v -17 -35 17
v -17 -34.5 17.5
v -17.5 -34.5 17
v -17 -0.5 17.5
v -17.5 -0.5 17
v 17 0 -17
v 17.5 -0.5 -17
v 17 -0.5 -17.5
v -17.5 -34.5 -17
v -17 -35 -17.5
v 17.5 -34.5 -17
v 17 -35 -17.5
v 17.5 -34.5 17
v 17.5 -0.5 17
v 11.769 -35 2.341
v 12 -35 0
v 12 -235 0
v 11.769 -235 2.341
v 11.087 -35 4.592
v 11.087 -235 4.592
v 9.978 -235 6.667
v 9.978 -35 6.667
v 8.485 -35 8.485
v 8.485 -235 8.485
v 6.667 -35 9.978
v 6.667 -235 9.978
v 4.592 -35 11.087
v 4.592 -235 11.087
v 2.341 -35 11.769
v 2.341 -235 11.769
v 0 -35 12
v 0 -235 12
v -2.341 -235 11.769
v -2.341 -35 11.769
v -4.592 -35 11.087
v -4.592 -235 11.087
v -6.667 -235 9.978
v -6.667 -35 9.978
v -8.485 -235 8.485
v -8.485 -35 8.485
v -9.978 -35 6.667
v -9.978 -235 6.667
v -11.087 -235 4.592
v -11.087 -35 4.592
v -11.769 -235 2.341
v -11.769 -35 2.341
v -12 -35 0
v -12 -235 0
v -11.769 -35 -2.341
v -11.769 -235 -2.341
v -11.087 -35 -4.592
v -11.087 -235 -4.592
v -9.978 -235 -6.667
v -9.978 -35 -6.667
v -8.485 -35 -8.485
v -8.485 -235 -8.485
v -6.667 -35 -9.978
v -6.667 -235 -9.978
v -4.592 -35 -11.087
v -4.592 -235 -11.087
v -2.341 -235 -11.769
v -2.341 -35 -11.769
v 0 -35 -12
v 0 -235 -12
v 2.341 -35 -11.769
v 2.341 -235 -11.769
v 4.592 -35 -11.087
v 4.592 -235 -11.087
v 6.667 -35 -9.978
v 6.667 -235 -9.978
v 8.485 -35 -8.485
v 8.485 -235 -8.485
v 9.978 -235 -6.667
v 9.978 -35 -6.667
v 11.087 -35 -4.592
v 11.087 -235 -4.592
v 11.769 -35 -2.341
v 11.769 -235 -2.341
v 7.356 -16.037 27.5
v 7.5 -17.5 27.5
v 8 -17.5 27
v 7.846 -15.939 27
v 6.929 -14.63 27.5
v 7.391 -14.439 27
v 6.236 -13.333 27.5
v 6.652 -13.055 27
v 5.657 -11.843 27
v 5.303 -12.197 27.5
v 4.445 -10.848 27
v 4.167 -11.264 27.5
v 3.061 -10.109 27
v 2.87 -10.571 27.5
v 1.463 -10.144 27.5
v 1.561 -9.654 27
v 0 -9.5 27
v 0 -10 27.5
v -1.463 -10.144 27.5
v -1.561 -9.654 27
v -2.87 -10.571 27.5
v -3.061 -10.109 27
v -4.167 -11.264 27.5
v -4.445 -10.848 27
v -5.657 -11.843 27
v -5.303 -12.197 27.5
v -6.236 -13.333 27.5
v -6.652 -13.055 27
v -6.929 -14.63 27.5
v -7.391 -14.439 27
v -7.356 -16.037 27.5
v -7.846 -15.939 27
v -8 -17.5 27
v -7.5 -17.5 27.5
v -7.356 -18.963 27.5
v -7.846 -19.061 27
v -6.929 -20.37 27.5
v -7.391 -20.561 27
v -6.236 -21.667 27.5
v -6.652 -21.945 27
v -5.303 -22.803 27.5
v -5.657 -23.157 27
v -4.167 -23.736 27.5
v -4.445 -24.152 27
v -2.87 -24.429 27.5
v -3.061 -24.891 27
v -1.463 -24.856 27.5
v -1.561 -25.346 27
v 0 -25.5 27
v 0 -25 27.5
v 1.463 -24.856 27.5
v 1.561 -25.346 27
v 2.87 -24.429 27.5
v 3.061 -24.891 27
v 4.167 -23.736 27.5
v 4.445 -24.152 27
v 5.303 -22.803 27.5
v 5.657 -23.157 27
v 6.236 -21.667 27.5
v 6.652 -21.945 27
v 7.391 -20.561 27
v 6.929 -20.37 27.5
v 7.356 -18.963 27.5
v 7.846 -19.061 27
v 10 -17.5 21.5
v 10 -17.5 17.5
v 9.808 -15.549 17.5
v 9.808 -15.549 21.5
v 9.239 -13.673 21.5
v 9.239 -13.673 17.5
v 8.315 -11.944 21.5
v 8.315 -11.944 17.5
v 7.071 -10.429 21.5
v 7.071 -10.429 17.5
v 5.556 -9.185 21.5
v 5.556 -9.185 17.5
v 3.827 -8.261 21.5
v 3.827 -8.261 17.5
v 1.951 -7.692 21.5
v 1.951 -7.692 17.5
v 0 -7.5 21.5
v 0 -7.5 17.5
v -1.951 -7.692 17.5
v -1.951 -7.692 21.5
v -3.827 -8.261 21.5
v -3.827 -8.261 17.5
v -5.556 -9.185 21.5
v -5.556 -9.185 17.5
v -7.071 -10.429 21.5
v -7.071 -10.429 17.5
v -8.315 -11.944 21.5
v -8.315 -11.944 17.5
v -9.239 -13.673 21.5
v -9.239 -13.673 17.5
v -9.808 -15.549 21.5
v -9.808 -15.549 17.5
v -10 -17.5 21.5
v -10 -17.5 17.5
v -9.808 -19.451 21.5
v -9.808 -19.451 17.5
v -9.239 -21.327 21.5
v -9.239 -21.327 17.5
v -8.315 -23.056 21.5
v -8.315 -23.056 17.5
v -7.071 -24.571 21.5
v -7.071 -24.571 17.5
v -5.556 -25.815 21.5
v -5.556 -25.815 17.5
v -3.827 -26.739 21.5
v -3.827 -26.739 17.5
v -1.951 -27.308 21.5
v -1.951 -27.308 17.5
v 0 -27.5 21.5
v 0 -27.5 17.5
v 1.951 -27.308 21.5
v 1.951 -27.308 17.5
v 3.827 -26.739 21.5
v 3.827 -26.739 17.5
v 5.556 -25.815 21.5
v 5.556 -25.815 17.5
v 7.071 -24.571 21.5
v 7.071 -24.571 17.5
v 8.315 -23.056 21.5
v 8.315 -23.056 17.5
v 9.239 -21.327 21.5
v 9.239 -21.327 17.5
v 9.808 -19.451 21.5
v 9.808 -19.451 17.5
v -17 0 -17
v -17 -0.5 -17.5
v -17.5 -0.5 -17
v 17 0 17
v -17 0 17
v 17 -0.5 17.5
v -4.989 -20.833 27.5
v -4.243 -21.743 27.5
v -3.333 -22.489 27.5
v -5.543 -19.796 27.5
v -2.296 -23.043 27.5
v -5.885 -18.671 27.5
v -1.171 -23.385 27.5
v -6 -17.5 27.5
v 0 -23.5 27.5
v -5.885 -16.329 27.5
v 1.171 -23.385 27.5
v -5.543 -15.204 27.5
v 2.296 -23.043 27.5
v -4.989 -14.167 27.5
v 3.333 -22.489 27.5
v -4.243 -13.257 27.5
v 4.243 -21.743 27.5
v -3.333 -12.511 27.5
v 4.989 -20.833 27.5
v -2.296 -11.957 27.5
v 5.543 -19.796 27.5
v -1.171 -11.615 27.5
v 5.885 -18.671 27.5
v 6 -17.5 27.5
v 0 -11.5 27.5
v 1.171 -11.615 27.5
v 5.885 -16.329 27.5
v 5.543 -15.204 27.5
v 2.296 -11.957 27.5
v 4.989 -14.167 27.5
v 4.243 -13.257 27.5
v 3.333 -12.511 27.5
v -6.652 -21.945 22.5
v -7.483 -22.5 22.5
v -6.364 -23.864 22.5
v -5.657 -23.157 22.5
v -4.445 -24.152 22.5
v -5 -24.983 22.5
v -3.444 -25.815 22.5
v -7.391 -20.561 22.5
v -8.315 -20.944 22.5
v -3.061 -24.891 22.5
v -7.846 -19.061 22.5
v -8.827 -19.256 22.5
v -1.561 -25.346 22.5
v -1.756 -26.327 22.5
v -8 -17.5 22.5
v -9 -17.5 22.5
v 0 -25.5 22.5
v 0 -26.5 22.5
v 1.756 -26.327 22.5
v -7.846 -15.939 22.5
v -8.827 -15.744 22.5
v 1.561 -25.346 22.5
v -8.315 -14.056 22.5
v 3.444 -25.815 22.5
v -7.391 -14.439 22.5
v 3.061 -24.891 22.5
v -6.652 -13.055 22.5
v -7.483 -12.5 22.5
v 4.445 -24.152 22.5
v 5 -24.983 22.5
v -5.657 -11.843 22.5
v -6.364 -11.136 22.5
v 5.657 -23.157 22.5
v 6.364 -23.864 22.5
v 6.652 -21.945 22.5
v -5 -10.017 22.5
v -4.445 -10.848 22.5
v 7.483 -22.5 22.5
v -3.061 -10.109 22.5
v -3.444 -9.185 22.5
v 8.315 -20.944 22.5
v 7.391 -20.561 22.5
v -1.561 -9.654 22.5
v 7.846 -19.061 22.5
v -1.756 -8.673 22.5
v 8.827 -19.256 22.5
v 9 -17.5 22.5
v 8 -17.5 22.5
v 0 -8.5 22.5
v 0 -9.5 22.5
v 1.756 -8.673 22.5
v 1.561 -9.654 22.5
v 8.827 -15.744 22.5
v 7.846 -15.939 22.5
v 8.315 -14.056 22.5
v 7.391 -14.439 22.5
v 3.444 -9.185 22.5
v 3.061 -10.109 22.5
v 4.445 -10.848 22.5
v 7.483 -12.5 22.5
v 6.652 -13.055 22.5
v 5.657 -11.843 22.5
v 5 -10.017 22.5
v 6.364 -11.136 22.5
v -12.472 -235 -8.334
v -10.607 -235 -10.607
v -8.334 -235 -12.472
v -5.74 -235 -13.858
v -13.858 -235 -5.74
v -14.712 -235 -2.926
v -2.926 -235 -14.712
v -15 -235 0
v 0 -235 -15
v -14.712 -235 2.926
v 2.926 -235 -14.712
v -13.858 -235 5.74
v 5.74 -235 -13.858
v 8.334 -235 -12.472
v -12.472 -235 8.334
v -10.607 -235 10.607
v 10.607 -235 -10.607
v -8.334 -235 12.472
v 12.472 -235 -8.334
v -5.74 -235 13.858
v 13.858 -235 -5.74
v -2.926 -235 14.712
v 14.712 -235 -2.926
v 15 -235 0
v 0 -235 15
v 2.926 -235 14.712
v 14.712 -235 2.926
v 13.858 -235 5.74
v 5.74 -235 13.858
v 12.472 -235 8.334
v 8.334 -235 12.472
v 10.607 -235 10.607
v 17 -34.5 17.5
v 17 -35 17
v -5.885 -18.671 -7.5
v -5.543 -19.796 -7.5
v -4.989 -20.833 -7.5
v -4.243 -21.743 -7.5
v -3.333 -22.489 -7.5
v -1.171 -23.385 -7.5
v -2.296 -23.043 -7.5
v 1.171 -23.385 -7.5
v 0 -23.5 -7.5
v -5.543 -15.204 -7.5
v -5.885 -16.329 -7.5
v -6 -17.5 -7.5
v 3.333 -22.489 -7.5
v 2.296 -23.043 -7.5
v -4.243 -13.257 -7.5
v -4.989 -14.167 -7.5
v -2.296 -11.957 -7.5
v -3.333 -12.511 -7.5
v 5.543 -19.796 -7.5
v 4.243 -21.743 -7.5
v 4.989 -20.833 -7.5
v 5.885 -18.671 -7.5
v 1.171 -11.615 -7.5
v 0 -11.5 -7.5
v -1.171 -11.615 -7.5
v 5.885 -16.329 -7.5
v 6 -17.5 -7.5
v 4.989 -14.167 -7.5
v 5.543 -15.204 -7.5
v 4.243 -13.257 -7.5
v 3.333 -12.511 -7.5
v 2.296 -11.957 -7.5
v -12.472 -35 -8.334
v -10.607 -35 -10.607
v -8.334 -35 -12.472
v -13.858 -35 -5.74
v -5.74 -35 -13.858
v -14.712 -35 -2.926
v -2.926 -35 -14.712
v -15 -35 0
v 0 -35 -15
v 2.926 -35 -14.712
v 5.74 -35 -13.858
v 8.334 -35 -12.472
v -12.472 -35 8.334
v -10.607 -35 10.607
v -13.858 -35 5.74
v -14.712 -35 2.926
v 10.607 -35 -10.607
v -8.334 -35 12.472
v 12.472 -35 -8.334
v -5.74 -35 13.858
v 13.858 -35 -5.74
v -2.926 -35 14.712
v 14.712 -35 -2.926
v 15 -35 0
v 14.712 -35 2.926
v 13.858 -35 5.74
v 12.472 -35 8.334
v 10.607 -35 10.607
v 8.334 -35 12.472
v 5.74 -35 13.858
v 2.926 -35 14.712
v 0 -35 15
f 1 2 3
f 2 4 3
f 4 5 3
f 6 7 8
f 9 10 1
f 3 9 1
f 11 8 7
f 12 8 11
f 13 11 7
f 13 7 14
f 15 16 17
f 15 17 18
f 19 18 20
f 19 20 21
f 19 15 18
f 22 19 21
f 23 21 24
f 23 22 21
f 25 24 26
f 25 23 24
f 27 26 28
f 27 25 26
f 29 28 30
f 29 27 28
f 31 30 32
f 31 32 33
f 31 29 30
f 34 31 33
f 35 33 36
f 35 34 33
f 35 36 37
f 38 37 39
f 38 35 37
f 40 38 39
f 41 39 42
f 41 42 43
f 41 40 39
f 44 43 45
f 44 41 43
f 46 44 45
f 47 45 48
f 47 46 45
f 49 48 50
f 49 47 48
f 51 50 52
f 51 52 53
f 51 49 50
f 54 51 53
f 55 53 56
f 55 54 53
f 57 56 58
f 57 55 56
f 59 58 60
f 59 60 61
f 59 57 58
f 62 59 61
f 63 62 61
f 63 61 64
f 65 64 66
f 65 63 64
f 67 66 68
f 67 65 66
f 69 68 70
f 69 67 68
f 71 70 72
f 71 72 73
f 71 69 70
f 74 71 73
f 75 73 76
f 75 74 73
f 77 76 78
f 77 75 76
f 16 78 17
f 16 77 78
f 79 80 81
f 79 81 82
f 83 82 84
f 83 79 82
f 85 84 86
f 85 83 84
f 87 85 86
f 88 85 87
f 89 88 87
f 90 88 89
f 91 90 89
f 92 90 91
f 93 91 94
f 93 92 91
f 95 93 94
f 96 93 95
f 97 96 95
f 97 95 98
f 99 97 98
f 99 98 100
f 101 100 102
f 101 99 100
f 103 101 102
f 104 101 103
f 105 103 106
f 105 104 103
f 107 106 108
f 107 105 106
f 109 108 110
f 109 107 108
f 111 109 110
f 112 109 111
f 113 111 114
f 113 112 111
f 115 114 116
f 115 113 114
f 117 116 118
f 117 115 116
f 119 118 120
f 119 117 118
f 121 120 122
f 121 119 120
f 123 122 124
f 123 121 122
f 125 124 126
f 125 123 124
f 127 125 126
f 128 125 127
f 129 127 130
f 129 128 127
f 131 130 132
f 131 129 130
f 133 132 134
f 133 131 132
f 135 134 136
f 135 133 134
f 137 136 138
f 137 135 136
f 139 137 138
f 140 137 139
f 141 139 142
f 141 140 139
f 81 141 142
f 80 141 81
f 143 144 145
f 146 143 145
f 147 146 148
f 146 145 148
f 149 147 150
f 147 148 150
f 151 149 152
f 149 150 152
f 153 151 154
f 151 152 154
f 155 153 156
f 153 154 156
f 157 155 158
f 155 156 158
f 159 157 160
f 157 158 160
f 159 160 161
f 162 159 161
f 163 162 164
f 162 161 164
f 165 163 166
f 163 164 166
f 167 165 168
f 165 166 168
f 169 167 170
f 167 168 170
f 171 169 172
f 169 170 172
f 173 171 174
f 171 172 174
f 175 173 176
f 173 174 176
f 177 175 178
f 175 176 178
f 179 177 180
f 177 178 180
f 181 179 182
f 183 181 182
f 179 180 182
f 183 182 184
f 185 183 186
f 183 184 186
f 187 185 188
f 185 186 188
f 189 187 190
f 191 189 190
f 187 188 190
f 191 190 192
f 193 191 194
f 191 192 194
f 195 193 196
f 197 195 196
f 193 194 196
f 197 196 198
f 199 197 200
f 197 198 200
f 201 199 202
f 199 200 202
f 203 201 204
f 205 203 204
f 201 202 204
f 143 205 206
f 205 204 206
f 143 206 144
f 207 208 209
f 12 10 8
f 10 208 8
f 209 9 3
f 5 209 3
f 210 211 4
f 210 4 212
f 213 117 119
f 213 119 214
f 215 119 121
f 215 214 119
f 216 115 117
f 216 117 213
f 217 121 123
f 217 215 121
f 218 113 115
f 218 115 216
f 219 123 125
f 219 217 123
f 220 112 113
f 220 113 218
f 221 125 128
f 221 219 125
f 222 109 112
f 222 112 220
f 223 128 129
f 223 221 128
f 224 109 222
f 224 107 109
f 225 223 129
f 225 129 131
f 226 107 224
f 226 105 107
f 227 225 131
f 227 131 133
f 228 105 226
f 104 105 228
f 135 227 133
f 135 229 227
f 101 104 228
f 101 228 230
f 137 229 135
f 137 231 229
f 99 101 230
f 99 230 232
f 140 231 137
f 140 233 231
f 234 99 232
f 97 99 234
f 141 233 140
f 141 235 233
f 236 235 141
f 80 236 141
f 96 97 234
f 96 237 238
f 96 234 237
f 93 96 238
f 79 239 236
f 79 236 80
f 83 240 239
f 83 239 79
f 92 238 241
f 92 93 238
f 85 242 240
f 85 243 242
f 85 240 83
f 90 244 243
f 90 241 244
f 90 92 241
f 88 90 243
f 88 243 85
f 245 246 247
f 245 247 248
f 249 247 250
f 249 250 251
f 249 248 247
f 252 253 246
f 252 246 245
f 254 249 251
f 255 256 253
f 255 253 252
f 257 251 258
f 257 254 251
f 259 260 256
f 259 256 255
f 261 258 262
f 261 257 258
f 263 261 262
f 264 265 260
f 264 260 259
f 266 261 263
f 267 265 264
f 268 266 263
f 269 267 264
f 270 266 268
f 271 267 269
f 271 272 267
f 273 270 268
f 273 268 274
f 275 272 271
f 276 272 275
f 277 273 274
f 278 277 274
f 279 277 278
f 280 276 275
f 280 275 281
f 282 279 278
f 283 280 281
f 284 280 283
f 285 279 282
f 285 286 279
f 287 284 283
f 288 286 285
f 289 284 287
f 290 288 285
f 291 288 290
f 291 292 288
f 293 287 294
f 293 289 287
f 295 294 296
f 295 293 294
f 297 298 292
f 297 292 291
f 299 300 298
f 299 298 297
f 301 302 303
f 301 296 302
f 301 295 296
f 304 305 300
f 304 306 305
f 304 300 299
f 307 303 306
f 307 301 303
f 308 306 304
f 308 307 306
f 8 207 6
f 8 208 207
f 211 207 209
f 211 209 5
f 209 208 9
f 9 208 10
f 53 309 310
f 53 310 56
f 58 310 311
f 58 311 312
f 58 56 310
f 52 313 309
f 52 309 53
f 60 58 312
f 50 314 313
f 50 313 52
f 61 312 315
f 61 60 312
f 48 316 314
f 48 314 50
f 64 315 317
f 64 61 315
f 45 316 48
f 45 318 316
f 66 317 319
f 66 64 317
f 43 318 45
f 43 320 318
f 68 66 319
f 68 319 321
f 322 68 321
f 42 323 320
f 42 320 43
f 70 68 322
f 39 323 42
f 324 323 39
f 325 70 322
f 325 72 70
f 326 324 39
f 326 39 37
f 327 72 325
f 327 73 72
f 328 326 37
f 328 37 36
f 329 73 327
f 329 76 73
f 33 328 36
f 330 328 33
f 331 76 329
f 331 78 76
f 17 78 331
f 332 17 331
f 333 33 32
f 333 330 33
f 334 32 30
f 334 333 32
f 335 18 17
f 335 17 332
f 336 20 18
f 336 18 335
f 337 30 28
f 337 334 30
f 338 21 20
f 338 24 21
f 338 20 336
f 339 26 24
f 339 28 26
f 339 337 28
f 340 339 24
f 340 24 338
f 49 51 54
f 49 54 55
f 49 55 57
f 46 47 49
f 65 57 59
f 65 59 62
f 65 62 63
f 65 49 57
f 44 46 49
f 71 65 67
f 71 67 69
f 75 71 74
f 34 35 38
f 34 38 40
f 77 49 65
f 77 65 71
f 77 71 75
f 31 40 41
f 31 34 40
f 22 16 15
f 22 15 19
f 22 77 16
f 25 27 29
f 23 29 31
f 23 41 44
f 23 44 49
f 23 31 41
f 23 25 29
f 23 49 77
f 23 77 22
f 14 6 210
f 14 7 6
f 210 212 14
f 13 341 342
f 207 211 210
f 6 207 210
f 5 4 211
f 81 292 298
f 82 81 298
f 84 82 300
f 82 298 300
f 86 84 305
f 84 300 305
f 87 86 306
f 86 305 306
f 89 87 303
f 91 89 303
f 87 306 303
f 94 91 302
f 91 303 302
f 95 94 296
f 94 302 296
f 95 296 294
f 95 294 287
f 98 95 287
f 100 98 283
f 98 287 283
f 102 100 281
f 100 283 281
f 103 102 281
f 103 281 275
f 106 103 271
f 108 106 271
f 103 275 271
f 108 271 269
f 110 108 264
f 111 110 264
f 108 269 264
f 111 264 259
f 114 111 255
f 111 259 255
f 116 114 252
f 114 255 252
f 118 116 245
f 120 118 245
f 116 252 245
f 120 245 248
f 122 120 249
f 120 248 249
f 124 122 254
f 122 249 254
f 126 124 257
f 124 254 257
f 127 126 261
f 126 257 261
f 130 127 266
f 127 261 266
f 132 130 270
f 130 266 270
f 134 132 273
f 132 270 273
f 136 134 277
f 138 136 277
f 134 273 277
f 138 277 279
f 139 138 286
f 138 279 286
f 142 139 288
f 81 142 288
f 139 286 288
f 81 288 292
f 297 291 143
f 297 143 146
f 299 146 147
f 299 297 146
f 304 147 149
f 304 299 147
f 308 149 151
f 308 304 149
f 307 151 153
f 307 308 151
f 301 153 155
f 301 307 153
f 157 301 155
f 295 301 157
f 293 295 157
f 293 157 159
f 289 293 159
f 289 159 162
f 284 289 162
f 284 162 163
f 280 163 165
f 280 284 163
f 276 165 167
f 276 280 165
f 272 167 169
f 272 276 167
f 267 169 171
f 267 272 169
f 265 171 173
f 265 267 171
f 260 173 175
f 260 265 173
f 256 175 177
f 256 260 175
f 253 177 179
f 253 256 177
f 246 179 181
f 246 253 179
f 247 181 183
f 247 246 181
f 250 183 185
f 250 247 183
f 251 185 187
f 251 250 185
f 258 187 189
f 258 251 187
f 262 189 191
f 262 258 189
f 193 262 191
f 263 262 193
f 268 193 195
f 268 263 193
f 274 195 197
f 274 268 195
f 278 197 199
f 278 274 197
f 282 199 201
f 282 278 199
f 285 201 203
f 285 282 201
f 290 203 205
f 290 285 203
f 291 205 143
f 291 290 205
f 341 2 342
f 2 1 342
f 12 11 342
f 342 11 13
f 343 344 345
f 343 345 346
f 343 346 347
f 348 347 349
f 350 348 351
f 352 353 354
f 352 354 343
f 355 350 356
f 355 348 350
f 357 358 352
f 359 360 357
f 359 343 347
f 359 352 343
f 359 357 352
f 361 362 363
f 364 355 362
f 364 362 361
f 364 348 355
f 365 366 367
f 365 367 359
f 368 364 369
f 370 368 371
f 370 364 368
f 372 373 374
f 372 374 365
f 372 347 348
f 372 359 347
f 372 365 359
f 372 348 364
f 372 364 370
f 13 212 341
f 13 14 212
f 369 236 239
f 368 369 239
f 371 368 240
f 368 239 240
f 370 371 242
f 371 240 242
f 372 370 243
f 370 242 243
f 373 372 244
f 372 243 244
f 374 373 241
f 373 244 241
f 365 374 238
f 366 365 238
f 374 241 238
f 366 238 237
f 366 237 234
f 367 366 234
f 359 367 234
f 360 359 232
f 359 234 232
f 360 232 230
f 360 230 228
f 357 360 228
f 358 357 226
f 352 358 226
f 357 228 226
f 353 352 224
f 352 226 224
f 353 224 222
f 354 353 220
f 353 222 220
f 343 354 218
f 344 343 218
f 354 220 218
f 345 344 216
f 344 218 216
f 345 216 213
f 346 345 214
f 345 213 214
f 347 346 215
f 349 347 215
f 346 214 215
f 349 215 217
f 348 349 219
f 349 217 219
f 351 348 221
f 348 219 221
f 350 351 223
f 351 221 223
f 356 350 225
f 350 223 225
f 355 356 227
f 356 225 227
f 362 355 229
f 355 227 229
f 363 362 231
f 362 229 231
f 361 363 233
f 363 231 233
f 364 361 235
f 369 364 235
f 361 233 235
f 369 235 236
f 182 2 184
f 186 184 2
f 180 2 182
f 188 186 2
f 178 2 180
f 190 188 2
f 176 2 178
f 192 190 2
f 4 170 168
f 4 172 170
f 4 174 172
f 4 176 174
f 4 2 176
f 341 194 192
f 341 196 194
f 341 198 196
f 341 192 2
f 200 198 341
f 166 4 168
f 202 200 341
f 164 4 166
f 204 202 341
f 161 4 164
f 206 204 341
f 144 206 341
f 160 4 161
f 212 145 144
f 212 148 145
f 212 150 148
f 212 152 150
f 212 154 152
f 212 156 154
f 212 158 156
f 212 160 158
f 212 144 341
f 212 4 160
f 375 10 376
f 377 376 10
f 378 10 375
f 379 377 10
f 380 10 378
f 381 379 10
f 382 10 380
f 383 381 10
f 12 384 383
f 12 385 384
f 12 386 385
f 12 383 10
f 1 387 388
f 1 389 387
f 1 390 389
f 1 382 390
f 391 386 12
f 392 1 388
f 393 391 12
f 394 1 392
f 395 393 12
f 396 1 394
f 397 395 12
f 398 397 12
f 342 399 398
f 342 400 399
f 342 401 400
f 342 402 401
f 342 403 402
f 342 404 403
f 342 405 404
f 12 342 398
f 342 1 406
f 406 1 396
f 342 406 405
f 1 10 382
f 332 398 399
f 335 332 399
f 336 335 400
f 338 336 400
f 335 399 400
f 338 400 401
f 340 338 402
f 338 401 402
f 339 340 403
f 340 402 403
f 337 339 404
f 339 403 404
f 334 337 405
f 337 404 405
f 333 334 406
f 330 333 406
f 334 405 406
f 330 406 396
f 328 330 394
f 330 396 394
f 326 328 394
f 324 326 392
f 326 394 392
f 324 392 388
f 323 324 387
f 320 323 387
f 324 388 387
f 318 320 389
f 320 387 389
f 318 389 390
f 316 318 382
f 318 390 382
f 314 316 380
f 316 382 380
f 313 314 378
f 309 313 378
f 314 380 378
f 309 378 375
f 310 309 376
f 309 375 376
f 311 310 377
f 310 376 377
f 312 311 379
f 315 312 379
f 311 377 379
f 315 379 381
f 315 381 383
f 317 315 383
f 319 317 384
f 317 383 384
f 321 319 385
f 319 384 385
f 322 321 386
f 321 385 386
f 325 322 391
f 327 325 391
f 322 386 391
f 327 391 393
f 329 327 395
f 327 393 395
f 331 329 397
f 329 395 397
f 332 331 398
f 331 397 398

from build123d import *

# Parameters (mm, degrees)
F0_W      = 35
F0_H      = 35
F1_DEPTH  = 35
F2_R      = 15
F2_R_2    = 12
F3_DEPTH  = 200
F4_R      = 10
F5_DEPTH  = 5
F6_R      = 8
F7_DEPTH  = 5
F8_SIZE   = 1
F9_SIZE   = 0.5
F10_R     = 6
F11_DEPTH = 35
F12_SIZE  = 0.5


# Not quite as in the source:
# - a feature names something its author has since deleted; it is built from what else it names


with BuildPart() as f1:
    # F0 (on Front) → F1 (new body)
    with BuildSketch(Plane.XZ):
        Rectangle(F0_W, F0_H)
    extrude(amount=F1_DEPTH)

    # F2 (on face) → F3 (join)
    with BuildSketch(Plane.XZ.offset(35)):
        Circle(F2_R)
        Circle(F2_R_2, mode=Mode.SUBTRACT)
    extrude(amount=F3_DEPTH)

    # F4 (on face) → F5 (join)
    with BuildSketch(Plane.XY.offset(17.5)):
        with Locations((0, -17.5)):
            Circle(F4_R)
    extrude(amount=F5_DEPTH)

    # F6 (on face) → F7 (join)
    with BuildSketch(Plane.XY.offset(22.5)):
        with Locations((0, -17.5)):
            Circle(F6_R)
    extrude(amount=F7_DEPTH)

    # F8
    f8_edges = [f1.edges().sort_by_distance(p)[0] for p in [
        (-10, -17.5, 22.5),
    ]]
    chamfer(f8_edges, length=F8_SIZE)

    # F9
    f9_edges = [f1.edges().sort_by_distance(p)[0] for p in [
        (-8, -17.5, 27.5),
    ]]
    chamfer(f9_edges, length=F9_SIZE)

    # F10 (on face) → F11 (cut)
    with BuildSketch(Plane.XY.offset(27.5)):
        with Locations((0, -17.5)):
            Circle(F10_R)
    extrude(amount=-F11_DEPTH, mode=Mode.SUBTRACT)

    # F12
    f12_edges = [f1.edges().sort_by_distance(p)[0] for p in [
        (0, -35, 17.5),
        (-17.5, -17.5, 17.5),
        (17.5, -17.5, 17.5),
        (0, 0, 17.5),
        (17.5, 0, 0),
        (17.5, -35, 0),
        (17.5, -17.5, -17.5),
        (0, 0, -17.5),
        (-17.5, -35, 0),
        (-17.5, -17.5, -17.5),
        (-17.5, 0, 0),
    ]]
    chamfer(f12_edges, length=F12_SIZE)


solid = f1.part
